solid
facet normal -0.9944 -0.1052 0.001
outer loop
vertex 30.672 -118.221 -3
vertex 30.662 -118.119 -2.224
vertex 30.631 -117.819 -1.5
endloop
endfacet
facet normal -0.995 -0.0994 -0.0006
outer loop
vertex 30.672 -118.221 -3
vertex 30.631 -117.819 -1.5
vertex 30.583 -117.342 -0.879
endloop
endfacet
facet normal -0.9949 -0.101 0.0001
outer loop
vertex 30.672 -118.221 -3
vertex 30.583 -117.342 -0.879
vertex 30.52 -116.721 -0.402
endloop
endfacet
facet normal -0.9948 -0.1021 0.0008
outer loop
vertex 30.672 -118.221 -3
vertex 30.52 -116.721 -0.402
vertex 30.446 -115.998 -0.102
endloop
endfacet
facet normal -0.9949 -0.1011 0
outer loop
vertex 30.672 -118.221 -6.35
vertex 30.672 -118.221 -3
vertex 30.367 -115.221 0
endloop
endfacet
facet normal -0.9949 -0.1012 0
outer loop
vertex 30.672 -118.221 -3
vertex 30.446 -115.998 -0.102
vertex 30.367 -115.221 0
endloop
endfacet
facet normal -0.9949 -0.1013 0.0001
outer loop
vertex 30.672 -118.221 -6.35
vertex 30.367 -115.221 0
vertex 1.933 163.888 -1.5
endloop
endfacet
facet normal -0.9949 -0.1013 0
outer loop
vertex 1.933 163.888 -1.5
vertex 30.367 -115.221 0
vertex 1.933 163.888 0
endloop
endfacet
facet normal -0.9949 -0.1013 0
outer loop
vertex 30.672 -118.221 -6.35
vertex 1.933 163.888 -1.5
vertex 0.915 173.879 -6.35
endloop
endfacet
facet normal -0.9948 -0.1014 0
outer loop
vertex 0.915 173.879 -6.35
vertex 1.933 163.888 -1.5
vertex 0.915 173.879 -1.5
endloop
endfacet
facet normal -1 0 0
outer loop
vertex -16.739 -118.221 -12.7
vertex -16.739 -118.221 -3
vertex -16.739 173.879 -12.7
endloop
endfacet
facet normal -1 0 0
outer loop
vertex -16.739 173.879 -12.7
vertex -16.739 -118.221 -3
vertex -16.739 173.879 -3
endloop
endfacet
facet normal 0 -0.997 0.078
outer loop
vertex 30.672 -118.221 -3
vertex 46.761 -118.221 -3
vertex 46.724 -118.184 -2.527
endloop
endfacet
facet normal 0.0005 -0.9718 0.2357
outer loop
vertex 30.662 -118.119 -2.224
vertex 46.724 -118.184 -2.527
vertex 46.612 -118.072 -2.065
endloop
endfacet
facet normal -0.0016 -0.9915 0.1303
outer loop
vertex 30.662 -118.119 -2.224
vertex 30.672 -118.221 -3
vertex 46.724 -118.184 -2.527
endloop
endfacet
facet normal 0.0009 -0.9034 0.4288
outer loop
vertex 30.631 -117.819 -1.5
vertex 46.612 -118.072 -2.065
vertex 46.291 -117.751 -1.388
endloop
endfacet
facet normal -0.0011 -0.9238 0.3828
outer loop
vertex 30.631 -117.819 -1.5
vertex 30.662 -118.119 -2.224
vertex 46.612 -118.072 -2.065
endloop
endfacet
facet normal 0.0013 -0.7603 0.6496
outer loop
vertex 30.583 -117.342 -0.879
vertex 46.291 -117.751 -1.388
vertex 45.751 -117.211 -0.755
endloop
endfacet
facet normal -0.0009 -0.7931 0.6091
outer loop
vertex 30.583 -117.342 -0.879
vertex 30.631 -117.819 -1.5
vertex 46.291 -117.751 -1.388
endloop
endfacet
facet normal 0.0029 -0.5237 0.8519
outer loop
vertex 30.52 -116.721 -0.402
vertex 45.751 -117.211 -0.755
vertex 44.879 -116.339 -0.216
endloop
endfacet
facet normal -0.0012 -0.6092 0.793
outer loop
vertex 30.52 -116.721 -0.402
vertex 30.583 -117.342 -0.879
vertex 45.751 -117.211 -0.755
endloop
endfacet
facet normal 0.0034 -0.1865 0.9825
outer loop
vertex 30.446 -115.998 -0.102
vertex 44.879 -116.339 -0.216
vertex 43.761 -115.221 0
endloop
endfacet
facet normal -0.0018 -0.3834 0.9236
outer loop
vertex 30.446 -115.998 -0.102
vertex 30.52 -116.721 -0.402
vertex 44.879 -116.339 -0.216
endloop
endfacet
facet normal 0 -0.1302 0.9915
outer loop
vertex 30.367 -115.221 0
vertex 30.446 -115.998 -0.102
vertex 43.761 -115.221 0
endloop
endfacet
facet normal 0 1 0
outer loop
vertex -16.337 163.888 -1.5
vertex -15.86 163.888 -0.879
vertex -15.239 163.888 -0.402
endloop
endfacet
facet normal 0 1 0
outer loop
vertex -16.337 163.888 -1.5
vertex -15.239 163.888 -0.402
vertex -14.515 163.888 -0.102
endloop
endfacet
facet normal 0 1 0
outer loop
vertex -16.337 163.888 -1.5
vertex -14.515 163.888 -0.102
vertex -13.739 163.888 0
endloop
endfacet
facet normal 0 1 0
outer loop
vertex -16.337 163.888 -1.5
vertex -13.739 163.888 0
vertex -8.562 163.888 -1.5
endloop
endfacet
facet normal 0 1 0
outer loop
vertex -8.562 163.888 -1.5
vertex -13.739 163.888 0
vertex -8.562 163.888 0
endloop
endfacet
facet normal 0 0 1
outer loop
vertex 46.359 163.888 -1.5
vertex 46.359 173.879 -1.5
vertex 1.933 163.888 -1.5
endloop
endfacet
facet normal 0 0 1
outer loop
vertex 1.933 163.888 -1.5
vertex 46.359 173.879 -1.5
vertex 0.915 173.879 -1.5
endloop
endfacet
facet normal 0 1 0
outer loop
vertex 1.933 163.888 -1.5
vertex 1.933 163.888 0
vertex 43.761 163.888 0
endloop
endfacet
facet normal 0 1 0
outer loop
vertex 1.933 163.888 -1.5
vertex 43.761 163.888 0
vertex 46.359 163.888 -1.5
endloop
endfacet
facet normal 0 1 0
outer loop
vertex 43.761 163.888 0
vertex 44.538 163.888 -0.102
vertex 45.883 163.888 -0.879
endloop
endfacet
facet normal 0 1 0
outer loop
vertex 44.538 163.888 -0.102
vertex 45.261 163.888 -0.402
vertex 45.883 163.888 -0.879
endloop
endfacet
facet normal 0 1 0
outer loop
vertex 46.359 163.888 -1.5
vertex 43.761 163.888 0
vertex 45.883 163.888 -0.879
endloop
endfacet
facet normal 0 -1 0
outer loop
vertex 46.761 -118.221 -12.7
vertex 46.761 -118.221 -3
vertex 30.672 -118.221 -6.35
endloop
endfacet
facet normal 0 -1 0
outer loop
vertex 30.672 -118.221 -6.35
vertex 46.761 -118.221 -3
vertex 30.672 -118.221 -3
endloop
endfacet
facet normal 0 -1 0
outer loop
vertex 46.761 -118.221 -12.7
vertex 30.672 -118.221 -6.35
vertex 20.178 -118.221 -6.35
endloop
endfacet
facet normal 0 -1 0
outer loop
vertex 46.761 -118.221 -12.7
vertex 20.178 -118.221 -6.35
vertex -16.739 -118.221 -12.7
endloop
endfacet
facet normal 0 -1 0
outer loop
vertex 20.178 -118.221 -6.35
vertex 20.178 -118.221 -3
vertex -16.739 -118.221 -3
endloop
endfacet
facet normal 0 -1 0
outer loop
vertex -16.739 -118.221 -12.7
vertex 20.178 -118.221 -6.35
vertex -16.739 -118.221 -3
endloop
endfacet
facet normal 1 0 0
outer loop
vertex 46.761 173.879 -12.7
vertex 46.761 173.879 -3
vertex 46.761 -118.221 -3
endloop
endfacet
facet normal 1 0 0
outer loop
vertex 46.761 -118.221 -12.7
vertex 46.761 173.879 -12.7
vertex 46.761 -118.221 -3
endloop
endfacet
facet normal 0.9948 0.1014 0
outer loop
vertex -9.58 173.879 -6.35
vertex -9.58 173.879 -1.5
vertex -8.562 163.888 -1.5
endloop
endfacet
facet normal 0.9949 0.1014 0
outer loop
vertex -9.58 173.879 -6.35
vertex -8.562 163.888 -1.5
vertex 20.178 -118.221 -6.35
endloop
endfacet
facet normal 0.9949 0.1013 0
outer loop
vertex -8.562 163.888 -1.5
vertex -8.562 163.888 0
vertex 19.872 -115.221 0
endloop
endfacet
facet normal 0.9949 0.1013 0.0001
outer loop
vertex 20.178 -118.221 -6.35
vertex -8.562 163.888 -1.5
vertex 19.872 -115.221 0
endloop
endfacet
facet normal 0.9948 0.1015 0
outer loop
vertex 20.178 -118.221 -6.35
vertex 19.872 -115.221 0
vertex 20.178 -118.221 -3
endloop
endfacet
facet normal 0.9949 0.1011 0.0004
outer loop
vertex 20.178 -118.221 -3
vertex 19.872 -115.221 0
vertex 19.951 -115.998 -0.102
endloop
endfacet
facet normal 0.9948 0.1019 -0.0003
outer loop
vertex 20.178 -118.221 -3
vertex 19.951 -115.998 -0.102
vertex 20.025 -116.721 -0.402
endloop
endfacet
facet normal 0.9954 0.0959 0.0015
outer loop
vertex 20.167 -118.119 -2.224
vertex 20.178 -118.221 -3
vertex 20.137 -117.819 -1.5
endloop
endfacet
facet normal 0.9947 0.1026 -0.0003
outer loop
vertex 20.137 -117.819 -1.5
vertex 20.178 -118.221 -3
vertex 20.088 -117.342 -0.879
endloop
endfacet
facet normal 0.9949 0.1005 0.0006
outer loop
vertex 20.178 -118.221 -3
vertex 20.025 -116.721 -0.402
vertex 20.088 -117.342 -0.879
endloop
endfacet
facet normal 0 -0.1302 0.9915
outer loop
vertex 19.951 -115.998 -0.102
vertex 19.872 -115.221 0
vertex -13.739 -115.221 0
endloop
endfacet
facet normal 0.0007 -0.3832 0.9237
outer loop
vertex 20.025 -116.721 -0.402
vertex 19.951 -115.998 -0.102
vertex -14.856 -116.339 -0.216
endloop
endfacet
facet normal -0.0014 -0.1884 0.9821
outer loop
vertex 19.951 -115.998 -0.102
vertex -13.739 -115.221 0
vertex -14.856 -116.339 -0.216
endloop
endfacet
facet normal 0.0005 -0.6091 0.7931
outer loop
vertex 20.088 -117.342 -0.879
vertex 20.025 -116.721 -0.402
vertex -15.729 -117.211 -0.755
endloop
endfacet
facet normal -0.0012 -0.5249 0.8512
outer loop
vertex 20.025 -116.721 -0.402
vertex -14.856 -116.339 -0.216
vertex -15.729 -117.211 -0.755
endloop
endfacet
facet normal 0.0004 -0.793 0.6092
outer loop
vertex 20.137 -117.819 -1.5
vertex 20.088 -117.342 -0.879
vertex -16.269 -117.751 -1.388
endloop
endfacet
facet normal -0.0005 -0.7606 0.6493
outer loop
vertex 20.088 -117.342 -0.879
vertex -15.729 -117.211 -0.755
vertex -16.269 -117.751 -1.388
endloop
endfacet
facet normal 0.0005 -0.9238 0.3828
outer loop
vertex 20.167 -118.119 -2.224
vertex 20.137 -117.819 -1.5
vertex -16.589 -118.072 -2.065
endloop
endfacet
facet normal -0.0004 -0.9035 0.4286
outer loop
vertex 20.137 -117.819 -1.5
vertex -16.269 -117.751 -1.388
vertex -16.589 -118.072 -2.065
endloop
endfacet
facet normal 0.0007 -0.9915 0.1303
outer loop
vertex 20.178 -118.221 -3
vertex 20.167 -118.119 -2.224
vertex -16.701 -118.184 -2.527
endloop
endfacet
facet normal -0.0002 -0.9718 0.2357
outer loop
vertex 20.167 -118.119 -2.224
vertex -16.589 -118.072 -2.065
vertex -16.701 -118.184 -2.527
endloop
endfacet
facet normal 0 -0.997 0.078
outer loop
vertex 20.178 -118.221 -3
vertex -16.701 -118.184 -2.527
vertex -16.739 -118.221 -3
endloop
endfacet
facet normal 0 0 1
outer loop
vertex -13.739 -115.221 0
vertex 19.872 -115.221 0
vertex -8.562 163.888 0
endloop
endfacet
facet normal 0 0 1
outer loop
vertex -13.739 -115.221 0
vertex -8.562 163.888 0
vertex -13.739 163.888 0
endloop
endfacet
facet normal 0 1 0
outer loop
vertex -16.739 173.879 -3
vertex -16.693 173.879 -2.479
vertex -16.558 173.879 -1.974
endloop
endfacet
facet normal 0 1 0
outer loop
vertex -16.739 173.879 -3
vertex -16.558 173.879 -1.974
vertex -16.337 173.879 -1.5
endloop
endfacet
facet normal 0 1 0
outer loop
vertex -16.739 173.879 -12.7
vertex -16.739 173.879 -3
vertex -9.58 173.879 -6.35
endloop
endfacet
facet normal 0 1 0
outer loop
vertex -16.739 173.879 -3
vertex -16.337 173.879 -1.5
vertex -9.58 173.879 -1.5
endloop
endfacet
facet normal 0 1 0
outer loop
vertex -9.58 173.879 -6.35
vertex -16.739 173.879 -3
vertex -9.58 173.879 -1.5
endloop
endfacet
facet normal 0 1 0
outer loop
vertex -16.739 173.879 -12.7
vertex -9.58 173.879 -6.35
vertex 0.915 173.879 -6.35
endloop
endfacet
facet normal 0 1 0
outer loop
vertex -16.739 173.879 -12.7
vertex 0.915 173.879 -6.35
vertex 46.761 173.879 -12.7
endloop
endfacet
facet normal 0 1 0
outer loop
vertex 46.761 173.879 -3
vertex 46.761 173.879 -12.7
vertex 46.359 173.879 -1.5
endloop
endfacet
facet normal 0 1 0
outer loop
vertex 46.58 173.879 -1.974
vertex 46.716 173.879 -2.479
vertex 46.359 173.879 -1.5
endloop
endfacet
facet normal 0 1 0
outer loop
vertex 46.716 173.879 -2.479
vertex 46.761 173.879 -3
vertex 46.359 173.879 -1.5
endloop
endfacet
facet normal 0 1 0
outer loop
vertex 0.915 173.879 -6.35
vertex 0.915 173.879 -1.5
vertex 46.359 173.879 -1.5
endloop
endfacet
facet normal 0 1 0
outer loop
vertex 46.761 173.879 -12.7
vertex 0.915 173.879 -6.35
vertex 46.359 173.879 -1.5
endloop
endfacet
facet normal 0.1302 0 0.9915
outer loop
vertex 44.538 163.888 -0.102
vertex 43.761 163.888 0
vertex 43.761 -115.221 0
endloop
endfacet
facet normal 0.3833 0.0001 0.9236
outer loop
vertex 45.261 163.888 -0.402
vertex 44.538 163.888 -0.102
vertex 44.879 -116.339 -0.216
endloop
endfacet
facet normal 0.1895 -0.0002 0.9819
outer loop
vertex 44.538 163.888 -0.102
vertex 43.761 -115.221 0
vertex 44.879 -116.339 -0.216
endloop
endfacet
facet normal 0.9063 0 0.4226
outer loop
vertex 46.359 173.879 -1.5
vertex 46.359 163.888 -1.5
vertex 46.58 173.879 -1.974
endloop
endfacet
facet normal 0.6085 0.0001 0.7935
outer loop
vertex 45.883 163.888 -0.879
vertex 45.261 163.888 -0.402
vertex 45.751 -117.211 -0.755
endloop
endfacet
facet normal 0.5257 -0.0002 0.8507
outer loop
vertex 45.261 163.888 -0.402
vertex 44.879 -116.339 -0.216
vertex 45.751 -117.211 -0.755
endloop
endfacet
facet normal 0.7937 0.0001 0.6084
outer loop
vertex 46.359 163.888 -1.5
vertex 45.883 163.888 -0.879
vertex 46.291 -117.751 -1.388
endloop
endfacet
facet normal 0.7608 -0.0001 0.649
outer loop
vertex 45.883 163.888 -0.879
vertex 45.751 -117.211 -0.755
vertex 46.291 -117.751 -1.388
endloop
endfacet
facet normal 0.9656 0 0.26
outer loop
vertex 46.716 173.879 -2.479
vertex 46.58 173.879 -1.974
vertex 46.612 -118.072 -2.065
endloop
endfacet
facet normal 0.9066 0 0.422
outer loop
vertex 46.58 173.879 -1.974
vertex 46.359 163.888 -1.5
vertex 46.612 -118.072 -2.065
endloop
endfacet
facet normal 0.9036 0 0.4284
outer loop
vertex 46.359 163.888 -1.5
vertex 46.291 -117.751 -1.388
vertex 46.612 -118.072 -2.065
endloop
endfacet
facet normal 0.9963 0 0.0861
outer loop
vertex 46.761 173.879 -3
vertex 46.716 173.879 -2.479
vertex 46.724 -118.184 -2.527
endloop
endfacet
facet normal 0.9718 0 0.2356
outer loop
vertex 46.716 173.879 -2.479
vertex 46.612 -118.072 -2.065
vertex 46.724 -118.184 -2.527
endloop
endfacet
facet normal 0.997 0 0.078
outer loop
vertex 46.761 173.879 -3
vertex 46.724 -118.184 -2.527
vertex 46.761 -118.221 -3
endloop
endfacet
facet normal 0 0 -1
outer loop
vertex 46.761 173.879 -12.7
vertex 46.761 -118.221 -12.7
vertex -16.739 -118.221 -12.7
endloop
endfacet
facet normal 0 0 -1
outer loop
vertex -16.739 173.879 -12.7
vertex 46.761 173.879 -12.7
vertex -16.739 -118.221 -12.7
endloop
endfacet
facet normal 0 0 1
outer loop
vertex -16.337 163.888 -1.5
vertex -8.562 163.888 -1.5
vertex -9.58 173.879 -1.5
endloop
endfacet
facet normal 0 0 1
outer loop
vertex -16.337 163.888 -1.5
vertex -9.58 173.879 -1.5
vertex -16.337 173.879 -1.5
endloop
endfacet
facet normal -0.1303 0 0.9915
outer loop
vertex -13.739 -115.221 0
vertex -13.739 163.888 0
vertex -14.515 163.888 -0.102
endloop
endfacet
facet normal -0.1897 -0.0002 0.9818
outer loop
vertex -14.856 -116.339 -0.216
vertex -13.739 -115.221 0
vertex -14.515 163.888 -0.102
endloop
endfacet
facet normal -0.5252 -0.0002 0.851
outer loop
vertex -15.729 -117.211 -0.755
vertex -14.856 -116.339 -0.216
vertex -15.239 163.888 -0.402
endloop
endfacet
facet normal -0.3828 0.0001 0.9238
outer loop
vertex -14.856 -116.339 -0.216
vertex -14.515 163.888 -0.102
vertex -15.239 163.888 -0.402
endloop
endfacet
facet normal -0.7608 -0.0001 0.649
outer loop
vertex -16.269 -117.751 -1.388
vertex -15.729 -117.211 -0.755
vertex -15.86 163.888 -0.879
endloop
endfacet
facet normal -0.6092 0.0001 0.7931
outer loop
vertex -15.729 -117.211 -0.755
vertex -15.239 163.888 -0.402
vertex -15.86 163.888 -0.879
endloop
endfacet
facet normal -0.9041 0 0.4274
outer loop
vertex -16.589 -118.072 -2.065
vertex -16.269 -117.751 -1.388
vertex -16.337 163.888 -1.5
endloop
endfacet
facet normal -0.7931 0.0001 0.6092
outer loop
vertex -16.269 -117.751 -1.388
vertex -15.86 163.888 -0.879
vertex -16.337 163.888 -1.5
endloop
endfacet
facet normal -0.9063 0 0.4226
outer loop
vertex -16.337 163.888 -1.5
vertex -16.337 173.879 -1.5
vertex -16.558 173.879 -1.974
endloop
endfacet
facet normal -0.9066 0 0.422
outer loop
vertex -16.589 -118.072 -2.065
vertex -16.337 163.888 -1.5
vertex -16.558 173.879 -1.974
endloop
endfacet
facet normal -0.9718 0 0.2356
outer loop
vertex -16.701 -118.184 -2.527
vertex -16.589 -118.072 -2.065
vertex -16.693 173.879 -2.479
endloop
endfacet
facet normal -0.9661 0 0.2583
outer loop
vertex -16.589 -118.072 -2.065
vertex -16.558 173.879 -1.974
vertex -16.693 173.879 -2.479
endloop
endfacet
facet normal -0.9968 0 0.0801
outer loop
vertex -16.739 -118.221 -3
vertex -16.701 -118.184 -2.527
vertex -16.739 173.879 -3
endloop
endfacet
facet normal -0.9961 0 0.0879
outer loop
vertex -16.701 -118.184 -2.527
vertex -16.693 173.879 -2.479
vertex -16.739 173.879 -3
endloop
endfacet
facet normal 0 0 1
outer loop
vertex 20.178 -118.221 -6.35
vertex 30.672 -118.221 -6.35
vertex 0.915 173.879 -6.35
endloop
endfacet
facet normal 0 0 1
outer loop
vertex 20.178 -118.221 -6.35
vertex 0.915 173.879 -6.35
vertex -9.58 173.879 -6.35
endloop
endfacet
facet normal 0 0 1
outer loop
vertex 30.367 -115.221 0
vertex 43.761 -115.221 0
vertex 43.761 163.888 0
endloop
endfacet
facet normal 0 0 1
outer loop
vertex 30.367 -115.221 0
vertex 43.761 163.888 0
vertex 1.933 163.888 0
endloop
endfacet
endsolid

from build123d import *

# Parameters (mm, degrees)
F1_DEPTH = 12.7
F2_DEPTH = 6.35
F3_START = 1.5
F3_DEPTH = 11.2
F4_START = 1.5
F4_DEPTH = 11.2
F5_R     = 3
F6_ANGLE = 180


with BuildPart() as f1:
    # F0 (on Top) → F1 (new body)
    with BuildSketch(Plane.XY):
        Polygon((-29.410376087, 163.8882011175), (-74.2387966365, 163.8882011175), (-74.2387966365, -118.2211643489), (-58.1500269473, -118.2211643489), align=None)
        Polygon((-17.8977344185, 173.8788356511), (-28.3925887197, 173.8788356511), (-29.410376087, 163.8882011175), (-58.1500269473, -118.2211643489), (-47.655172646, -118.2211643489), (-18.9155217858, 163.8882011175), align=None)
        Polygon((-10.7387966365, 163.8882011175), (-18.9155217858, 163.8882011175), (-47.655172646, -118.2211643489), (-42.4887966365, -118.2211643489), (-10.7387966365, -118.2211643489), align=None)
    extrude(amount=F1_DEPTH)

    # F0 (on Top) → F2 (cut)
    with BuildSketch(Plane.XY):
        Polygon((-17.8977344185, 173.8788356511), (-28.3925887197, 173.8788356511), (-29.410376087, 163.8882011175), (-58.1500269473, -118.2211643489), (-47.655172646, -118.2211643489), (-18.9155217858, 163.8882011175), align=None)
    extrude(amount=F2_DEPTH, mode=Mode.SUBTRACT)

    # F0 (on Top) → F3 (join)
    with BuildSketch(Plane.XY.offset(F3_START)):
        Polygon((-28.3925887197, 173.8788356511), (-74.2387966365, 173.8788356511), (-74.2387966365, 163.8882011175), (-29.410376087, 163.8882011175), align=None)
    extrude(amount=F3_DEPTH)

    # F0 (on Top) → F4 (join)
    with BuildSketch(Plane.XY.offset(F4_START)):
        Polygon((-10.7387966365, 173.8788356511), (-17.8977344185, 173.8788356511), (-18.9155217858, 163.8882011175), (-10.7387966365, 163.8882011175), align=None)
    extrude(amount=F4_DEPTH)

    # F5
    f5_edges = [f1.edges().sort_by_distance(p)[0] for p in [
        (-74.238797, 22.833518, 0),
        (-10.738797, 22.833518, 0),
        (-29.196985, -118.221164, 0),
        (-66.194412, -118.221164, 0),
    ]]
    fillet(f5_edges, radius=F5_R)


with BuildPart() as f1_1:
    # F6: moved
    add(f1.part.rotate(Axis((-13.7387966365, 24.3335183843, 0), (0, -1, 0)), F6_ANGLE))


solid = f1_1.part
